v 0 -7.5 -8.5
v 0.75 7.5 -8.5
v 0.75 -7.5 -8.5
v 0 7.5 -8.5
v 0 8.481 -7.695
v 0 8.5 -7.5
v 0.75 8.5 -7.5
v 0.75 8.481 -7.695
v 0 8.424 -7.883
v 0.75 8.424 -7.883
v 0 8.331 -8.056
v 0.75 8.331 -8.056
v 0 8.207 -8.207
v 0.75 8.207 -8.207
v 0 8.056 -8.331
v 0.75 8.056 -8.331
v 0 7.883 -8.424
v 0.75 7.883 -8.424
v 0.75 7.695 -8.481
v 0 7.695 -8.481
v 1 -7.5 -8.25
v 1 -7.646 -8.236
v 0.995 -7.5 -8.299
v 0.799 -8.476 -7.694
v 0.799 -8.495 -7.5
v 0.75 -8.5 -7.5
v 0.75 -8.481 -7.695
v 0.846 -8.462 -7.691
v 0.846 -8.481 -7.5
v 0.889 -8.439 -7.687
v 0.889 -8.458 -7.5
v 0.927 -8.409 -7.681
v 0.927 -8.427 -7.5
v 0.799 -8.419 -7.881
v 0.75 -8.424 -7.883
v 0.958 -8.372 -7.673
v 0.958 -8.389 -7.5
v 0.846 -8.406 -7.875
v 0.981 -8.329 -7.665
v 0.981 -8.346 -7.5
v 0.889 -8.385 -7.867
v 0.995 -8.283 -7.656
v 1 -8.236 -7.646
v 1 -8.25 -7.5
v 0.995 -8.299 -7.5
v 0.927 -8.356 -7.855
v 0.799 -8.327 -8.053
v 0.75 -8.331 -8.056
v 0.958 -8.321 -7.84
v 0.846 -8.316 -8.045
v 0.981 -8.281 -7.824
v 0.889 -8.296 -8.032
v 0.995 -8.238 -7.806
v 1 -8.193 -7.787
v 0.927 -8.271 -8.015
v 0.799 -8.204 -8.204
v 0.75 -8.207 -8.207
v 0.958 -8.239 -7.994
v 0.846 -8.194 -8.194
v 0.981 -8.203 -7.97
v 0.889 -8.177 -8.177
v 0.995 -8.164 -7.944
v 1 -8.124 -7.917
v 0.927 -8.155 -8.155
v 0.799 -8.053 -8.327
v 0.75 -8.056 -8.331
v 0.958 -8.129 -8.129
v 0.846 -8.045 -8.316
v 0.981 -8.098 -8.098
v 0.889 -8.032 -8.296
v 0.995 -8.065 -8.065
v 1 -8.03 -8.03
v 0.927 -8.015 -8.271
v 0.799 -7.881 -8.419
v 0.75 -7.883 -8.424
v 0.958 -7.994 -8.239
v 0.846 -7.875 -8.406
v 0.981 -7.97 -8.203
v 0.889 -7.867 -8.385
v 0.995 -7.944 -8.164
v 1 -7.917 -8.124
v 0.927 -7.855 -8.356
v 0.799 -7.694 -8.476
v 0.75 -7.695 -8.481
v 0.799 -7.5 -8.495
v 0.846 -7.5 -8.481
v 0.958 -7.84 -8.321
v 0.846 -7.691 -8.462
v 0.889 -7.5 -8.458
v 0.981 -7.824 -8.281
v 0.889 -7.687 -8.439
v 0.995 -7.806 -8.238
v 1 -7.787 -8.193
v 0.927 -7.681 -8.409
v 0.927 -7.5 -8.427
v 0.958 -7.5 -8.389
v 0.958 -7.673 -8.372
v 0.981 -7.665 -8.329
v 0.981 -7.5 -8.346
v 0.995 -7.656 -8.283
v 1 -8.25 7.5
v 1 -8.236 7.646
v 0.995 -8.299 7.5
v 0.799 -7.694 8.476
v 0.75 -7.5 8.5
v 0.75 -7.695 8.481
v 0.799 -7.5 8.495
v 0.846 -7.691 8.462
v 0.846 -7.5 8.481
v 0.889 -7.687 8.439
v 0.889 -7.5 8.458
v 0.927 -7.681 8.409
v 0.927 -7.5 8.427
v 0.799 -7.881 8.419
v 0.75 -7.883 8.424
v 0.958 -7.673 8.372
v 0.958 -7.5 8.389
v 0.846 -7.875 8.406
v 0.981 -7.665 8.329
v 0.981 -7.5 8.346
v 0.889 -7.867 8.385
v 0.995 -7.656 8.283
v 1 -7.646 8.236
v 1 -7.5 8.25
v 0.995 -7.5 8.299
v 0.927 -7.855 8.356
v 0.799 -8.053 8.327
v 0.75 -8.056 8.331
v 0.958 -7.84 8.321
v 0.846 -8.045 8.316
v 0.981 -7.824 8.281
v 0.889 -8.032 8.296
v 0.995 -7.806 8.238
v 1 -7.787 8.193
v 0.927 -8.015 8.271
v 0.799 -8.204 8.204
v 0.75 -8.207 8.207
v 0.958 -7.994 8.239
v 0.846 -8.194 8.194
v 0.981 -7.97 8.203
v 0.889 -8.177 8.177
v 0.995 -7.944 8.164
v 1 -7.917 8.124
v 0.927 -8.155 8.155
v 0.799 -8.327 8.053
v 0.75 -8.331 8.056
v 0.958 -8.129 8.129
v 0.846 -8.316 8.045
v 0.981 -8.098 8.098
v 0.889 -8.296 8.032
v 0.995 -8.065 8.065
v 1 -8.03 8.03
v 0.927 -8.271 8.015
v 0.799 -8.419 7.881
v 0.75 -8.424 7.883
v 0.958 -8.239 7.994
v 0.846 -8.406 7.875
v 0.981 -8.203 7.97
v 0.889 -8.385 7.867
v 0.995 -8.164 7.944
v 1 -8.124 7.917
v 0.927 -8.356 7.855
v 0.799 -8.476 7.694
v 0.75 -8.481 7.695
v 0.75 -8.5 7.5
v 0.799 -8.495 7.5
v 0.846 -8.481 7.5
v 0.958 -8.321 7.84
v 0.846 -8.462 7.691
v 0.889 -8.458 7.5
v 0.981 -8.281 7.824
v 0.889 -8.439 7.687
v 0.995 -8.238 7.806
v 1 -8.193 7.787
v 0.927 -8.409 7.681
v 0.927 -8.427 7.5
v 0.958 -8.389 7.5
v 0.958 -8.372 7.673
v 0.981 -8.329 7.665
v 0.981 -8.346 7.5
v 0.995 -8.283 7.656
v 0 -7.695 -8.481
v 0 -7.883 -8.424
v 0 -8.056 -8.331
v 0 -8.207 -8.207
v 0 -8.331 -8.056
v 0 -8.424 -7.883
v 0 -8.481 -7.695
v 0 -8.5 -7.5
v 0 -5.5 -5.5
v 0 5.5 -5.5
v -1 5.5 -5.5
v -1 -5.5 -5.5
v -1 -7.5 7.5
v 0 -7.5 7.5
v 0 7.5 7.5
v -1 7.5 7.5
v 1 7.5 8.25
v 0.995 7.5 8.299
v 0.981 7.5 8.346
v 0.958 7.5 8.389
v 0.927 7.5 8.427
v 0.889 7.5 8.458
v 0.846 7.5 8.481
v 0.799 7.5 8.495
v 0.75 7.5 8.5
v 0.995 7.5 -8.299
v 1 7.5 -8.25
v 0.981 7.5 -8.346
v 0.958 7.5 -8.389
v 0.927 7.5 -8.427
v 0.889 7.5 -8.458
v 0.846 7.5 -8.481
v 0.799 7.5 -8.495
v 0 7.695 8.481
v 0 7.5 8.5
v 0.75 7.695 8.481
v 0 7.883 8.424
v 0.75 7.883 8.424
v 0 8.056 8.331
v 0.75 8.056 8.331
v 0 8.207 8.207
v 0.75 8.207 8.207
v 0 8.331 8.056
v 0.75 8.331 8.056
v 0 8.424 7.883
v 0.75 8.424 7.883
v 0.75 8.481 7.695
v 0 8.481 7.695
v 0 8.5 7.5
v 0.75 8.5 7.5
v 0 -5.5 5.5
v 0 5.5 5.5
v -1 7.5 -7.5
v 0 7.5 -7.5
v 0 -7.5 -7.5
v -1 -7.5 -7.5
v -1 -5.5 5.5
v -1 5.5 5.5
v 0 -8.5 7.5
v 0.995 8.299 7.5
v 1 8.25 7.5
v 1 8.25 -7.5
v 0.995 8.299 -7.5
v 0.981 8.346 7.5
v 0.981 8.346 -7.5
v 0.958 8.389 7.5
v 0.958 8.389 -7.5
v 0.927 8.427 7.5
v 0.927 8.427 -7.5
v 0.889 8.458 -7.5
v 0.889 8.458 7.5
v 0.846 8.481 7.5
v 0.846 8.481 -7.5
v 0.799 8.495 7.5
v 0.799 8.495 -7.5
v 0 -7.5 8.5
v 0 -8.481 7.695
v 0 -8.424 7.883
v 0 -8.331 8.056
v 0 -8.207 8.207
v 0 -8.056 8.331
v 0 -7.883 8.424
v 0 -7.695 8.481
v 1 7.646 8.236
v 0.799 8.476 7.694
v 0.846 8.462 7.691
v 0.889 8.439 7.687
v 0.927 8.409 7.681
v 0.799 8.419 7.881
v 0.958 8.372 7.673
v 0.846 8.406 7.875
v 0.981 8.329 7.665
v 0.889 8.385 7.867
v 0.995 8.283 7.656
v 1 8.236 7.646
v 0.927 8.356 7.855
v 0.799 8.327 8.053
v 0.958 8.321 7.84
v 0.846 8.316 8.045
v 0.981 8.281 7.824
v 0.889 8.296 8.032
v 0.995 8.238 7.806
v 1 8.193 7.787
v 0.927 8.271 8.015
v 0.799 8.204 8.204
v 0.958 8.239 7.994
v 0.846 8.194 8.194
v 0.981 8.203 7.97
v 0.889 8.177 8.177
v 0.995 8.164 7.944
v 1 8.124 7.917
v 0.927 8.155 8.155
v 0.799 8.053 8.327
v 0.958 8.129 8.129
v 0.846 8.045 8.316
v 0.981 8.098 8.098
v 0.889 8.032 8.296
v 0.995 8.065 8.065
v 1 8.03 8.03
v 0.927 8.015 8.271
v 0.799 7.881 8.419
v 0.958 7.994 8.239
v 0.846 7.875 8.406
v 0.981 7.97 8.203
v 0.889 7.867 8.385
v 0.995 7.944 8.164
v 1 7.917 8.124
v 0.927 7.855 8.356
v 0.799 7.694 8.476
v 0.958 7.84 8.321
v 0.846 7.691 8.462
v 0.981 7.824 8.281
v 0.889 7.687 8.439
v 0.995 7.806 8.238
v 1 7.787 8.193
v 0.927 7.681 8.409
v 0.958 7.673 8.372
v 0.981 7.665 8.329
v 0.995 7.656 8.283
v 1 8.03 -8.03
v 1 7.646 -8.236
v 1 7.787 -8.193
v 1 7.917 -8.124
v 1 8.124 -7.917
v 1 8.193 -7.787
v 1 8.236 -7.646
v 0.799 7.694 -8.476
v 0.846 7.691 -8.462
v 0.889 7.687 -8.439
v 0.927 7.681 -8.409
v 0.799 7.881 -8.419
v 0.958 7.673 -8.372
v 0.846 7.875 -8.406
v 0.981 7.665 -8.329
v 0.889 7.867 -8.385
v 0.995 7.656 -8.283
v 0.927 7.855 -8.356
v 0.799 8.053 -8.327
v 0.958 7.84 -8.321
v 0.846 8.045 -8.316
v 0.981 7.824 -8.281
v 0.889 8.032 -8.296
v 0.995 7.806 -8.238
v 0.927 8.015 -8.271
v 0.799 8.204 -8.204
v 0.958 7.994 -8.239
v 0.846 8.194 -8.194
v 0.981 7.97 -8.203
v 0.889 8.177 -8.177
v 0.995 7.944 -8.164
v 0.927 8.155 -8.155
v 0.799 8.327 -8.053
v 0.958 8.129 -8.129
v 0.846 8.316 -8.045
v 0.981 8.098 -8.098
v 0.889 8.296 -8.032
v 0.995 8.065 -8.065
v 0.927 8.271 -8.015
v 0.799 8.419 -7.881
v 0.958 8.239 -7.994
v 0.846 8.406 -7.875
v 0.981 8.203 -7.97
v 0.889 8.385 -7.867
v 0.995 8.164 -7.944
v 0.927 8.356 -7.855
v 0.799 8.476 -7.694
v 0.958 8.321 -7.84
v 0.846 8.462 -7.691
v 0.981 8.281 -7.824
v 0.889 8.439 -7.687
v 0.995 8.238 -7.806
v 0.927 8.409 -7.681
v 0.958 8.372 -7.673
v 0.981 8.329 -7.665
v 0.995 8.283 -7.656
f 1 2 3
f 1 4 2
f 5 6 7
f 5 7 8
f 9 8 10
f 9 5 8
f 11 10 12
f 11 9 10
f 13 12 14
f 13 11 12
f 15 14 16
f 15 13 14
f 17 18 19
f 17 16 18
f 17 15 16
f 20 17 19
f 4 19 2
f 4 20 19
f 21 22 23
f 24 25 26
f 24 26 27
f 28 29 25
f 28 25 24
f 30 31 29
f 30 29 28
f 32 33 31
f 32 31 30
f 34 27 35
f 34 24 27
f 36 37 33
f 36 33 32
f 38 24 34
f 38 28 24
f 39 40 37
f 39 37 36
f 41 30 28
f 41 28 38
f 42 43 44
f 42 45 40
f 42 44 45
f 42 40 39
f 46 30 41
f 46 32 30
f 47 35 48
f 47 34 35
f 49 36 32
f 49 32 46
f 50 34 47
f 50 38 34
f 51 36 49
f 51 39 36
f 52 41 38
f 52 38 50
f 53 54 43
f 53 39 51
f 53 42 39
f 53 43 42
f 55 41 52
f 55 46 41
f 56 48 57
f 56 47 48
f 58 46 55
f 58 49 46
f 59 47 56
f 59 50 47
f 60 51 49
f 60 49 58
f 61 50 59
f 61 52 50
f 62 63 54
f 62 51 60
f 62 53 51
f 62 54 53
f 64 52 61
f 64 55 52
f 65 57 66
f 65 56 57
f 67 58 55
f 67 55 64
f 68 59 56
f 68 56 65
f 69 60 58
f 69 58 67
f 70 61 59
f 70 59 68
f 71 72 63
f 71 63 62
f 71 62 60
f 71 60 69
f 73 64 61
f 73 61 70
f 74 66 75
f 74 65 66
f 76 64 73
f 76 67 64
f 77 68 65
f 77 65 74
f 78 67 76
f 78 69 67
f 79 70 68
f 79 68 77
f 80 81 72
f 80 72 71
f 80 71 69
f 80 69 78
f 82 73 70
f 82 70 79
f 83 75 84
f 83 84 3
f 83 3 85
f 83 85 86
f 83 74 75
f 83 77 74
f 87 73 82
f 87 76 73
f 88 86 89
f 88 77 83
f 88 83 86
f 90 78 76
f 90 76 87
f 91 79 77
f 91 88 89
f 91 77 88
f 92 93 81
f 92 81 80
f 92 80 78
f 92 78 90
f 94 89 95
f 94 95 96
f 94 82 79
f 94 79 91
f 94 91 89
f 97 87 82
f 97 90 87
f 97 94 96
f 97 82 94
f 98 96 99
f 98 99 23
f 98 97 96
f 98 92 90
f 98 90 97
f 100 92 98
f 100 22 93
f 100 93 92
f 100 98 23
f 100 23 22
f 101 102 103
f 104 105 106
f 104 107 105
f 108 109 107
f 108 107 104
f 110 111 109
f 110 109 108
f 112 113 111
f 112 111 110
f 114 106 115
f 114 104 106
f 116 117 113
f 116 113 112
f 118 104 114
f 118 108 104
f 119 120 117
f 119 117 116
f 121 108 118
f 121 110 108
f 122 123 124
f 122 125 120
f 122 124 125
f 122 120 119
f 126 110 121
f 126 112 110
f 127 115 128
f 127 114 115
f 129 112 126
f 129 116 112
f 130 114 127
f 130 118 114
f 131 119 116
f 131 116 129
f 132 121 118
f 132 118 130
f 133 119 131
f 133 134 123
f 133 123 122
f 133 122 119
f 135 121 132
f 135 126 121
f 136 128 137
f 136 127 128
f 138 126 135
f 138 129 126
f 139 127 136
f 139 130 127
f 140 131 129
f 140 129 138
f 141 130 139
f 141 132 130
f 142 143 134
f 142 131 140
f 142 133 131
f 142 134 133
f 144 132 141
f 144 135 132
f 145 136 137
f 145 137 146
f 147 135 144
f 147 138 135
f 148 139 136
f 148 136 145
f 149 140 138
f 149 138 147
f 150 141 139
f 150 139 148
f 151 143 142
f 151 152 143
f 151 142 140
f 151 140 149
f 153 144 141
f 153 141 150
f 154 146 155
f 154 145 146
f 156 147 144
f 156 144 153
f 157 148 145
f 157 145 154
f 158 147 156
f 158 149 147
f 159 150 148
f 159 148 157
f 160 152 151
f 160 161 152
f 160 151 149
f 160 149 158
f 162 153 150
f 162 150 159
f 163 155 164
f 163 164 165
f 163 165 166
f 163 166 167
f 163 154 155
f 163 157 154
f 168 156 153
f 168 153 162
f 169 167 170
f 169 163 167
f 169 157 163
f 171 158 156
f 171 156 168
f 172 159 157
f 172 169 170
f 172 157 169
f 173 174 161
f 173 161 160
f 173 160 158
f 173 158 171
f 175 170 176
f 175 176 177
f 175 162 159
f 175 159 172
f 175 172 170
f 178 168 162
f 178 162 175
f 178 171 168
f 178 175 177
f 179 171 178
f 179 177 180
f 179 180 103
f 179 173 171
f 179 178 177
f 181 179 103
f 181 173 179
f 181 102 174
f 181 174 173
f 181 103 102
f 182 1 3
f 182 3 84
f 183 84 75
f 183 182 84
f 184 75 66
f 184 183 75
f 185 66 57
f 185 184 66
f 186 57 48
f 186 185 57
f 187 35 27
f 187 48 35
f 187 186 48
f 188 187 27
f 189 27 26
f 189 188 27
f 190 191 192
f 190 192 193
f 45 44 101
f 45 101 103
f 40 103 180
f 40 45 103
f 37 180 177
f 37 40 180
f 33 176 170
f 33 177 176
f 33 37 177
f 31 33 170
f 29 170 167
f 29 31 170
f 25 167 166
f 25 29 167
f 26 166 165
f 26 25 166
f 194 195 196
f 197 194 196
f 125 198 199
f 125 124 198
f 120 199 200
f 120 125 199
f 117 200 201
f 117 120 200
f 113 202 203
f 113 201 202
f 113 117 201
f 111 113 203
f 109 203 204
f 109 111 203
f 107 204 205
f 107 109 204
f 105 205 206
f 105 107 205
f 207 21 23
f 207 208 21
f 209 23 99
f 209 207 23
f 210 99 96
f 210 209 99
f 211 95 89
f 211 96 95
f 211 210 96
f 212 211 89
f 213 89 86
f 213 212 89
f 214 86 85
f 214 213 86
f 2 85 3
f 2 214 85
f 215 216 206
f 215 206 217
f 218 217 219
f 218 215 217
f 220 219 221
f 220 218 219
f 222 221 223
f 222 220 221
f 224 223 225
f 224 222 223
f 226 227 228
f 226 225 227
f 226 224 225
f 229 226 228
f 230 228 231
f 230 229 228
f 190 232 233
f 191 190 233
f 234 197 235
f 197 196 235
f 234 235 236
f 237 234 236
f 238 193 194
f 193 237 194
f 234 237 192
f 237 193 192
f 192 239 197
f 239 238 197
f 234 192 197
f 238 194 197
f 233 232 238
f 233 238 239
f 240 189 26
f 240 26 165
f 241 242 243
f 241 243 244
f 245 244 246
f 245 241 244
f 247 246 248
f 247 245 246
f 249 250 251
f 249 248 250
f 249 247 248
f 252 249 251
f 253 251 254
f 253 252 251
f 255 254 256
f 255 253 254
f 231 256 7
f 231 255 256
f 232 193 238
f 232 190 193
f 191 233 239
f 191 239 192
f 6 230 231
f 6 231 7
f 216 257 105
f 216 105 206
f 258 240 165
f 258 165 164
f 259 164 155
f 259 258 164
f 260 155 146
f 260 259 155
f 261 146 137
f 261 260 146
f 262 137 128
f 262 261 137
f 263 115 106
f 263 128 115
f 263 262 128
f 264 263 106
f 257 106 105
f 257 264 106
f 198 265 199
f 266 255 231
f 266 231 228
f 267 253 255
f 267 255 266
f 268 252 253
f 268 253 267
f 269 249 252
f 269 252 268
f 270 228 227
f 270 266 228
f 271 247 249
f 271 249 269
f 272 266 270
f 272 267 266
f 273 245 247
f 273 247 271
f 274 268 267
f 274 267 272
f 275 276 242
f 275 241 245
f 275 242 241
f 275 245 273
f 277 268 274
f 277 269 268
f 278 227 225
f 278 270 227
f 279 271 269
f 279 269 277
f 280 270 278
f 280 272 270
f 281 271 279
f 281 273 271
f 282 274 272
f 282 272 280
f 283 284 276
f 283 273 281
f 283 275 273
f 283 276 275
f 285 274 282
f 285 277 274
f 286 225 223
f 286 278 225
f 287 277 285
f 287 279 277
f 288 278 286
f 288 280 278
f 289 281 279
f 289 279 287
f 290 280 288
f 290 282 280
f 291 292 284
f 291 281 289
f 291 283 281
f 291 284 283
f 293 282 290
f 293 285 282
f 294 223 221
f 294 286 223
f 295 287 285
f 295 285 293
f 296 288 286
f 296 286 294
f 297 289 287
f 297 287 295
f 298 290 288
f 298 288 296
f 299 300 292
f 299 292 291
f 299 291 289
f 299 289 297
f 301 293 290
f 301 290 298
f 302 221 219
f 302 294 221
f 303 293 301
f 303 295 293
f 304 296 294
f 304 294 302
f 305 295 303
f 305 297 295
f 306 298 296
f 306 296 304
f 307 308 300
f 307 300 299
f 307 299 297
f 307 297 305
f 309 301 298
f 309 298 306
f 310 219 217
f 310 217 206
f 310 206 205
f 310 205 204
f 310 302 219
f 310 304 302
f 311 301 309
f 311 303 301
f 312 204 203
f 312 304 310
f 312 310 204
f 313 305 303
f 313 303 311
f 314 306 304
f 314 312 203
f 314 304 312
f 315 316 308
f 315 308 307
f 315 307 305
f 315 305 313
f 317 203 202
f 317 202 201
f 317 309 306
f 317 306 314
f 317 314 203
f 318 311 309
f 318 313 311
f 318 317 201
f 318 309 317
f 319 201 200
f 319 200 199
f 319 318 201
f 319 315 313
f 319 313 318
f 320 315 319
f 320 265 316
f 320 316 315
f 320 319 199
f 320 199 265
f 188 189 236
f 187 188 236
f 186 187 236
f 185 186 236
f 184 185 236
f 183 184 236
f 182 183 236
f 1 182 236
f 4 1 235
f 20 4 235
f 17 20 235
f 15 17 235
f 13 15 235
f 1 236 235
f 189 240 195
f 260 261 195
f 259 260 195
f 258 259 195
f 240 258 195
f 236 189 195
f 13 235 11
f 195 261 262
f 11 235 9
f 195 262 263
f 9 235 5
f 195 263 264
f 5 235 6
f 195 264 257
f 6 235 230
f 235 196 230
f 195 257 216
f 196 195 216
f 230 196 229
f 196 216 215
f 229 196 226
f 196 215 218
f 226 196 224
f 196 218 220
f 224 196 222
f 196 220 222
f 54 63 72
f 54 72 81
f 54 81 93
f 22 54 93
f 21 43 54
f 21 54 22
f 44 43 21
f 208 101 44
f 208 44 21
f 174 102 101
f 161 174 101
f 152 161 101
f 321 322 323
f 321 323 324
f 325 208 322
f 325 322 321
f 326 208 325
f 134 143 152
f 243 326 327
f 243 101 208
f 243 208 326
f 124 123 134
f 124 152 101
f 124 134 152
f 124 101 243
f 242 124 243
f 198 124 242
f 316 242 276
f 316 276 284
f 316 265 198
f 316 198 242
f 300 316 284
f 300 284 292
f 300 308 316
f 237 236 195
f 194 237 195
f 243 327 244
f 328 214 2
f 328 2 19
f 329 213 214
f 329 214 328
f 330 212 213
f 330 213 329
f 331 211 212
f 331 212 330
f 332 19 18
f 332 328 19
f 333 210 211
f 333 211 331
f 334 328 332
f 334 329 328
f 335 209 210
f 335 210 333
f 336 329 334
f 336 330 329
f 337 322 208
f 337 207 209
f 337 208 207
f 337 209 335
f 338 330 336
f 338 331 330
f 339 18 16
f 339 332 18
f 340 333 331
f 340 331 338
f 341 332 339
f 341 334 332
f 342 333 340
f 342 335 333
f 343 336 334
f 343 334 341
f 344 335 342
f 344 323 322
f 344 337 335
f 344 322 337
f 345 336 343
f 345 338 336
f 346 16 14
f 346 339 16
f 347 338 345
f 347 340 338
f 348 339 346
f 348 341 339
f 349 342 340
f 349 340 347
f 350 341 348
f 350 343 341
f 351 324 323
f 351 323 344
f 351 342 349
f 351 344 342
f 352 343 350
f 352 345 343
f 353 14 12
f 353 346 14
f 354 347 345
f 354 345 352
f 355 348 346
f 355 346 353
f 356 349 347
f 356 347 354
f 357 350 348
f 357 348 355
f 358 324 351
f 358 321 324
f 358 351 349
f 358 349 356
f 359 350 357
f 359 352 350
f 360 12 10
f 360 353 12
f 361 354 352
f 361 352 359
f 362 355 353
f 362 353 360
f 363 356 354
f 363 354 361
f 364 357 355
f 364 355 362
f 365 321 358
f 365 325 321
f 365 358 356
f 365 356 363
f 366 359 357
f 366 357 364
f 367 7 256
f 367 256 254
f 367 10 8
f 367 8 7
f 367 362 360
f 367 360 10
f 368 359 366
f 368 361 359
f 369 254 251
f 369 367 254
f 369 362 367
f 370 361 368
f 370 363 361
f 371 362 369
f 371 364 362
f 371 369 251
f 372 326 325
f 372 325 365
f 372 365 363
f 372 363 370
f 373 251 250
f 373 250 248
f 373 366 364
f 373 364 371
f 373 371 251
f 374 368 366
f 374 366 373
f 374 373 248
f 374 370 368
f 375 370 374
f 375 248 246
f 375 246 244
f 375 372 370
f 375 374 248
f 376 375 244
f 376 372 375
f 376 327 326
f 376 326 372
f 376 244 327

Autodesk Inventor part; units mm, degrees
ref_plane "YZ Plane" through (0, 0, 0) normal (1, 0, 0) x (0, 1, 0)
ref_plane "XZ Plane" through (0, 0, 0) normal (0, 1, 0) x (-1, 0, 0)
ref_plane "XY Plane" through (0, 0, 0) normal (0, 0, 1) x (1, 0, 0)
sketch "Sketch1" plane through (0, 0, 0) normal (1, 0, 0) x (0, 1, 0)
  line L0 (-7.5, 8.5) -> (7.5, 8.5)
  line L1 (8.5, 7.5) -> (8.5, -7.5)
  line L2 (7.5, -8.5) -> (-7.5, -8.5)
  line L3 (-8.5, -7.5) -> (-8.5, 7.5)
  line L4 (-8.5, 8.5) -> (8.5, -8.5) construction
  line L5 (8.5, 8.5) -> (-8.5, -8.5) construction
  line L6 (-7.5, 7.5) -> (7.5, 7.5)
  line L7 (7.5, 7.5) -> (7.5, -7.5)
  line L8 (7.5, -7.5) -> (-7.5, -7.5)
  line L9 (-7.5, -7.5) -> (-7.5, 7.5)
  line L10 (-7.5, 7.5) -> (7.5, -7.5) construction
  line L11 (7.5, 7.5) -> (-7.5, -7.5) construction
  line L12 (-5.5, 5.5) -> (5.5, 5.5)
  line L13 (5.5, 5.5) -> (5.5, -5.5)
  line L14 (5.5, -5.5) -> (-5.5, -5.5)
  line L15 (-5.5, -5.5) -> (-5.5, 5.5)
  line L16 (-5.5, 5.5) -> (5.5, -5.5) construction
  line L17 (5.5, 5.5) -> (-5.5, -5.5) construction
  arc A0 (8.5, 7.5) -> (7.5, 8.5) centre (7.5, 7.5) ccw
  arc A1 (-7.5, 8.5) -> (-8.5, 7.5) centre (-7.5, 7.5) ccw
  arc A2 (-8.5, -7.5) -> (-7.5, -8.5) centre (-7.5, -7.5) ccw
  arc A3 (7.5, -8.5) -> (8.5, -7.5) centre (7.5, -7.5) ccw
  point P0 (0, 0)
  dimension "d0" = 17
  dimension "d1" = 17
  dimension "d2" = 15
  dimension "d3" = 15
  dimension "d4" = 11
  dimension "d5" = 11
  dimension "d12" = 1
extrude "Extrusion3" add sketch "Sketch1" along normal blind 1 contours L0 A0 L1 A3 L2 A2 L3 A1 | L6 L7 L8 L9 | L12 L13 L14 L15
extrude "Extrusion4" add sketch "Sketch1" against normal blind 1 contours L6 L7 L8 L9
fillet "Fillet3" radius 0.25 8 edges at (1, 8.2071, 8.2071) (1, 0, 8.5) (1, -8.2071, 8.2071) (1, -8.5, 0) (1, -8.2071, -8.2071) (1, 0, -8.5) (1, 8.2071, -8.2071) (1, 8.5, 0)
properties part number "cube-inlay-red"
